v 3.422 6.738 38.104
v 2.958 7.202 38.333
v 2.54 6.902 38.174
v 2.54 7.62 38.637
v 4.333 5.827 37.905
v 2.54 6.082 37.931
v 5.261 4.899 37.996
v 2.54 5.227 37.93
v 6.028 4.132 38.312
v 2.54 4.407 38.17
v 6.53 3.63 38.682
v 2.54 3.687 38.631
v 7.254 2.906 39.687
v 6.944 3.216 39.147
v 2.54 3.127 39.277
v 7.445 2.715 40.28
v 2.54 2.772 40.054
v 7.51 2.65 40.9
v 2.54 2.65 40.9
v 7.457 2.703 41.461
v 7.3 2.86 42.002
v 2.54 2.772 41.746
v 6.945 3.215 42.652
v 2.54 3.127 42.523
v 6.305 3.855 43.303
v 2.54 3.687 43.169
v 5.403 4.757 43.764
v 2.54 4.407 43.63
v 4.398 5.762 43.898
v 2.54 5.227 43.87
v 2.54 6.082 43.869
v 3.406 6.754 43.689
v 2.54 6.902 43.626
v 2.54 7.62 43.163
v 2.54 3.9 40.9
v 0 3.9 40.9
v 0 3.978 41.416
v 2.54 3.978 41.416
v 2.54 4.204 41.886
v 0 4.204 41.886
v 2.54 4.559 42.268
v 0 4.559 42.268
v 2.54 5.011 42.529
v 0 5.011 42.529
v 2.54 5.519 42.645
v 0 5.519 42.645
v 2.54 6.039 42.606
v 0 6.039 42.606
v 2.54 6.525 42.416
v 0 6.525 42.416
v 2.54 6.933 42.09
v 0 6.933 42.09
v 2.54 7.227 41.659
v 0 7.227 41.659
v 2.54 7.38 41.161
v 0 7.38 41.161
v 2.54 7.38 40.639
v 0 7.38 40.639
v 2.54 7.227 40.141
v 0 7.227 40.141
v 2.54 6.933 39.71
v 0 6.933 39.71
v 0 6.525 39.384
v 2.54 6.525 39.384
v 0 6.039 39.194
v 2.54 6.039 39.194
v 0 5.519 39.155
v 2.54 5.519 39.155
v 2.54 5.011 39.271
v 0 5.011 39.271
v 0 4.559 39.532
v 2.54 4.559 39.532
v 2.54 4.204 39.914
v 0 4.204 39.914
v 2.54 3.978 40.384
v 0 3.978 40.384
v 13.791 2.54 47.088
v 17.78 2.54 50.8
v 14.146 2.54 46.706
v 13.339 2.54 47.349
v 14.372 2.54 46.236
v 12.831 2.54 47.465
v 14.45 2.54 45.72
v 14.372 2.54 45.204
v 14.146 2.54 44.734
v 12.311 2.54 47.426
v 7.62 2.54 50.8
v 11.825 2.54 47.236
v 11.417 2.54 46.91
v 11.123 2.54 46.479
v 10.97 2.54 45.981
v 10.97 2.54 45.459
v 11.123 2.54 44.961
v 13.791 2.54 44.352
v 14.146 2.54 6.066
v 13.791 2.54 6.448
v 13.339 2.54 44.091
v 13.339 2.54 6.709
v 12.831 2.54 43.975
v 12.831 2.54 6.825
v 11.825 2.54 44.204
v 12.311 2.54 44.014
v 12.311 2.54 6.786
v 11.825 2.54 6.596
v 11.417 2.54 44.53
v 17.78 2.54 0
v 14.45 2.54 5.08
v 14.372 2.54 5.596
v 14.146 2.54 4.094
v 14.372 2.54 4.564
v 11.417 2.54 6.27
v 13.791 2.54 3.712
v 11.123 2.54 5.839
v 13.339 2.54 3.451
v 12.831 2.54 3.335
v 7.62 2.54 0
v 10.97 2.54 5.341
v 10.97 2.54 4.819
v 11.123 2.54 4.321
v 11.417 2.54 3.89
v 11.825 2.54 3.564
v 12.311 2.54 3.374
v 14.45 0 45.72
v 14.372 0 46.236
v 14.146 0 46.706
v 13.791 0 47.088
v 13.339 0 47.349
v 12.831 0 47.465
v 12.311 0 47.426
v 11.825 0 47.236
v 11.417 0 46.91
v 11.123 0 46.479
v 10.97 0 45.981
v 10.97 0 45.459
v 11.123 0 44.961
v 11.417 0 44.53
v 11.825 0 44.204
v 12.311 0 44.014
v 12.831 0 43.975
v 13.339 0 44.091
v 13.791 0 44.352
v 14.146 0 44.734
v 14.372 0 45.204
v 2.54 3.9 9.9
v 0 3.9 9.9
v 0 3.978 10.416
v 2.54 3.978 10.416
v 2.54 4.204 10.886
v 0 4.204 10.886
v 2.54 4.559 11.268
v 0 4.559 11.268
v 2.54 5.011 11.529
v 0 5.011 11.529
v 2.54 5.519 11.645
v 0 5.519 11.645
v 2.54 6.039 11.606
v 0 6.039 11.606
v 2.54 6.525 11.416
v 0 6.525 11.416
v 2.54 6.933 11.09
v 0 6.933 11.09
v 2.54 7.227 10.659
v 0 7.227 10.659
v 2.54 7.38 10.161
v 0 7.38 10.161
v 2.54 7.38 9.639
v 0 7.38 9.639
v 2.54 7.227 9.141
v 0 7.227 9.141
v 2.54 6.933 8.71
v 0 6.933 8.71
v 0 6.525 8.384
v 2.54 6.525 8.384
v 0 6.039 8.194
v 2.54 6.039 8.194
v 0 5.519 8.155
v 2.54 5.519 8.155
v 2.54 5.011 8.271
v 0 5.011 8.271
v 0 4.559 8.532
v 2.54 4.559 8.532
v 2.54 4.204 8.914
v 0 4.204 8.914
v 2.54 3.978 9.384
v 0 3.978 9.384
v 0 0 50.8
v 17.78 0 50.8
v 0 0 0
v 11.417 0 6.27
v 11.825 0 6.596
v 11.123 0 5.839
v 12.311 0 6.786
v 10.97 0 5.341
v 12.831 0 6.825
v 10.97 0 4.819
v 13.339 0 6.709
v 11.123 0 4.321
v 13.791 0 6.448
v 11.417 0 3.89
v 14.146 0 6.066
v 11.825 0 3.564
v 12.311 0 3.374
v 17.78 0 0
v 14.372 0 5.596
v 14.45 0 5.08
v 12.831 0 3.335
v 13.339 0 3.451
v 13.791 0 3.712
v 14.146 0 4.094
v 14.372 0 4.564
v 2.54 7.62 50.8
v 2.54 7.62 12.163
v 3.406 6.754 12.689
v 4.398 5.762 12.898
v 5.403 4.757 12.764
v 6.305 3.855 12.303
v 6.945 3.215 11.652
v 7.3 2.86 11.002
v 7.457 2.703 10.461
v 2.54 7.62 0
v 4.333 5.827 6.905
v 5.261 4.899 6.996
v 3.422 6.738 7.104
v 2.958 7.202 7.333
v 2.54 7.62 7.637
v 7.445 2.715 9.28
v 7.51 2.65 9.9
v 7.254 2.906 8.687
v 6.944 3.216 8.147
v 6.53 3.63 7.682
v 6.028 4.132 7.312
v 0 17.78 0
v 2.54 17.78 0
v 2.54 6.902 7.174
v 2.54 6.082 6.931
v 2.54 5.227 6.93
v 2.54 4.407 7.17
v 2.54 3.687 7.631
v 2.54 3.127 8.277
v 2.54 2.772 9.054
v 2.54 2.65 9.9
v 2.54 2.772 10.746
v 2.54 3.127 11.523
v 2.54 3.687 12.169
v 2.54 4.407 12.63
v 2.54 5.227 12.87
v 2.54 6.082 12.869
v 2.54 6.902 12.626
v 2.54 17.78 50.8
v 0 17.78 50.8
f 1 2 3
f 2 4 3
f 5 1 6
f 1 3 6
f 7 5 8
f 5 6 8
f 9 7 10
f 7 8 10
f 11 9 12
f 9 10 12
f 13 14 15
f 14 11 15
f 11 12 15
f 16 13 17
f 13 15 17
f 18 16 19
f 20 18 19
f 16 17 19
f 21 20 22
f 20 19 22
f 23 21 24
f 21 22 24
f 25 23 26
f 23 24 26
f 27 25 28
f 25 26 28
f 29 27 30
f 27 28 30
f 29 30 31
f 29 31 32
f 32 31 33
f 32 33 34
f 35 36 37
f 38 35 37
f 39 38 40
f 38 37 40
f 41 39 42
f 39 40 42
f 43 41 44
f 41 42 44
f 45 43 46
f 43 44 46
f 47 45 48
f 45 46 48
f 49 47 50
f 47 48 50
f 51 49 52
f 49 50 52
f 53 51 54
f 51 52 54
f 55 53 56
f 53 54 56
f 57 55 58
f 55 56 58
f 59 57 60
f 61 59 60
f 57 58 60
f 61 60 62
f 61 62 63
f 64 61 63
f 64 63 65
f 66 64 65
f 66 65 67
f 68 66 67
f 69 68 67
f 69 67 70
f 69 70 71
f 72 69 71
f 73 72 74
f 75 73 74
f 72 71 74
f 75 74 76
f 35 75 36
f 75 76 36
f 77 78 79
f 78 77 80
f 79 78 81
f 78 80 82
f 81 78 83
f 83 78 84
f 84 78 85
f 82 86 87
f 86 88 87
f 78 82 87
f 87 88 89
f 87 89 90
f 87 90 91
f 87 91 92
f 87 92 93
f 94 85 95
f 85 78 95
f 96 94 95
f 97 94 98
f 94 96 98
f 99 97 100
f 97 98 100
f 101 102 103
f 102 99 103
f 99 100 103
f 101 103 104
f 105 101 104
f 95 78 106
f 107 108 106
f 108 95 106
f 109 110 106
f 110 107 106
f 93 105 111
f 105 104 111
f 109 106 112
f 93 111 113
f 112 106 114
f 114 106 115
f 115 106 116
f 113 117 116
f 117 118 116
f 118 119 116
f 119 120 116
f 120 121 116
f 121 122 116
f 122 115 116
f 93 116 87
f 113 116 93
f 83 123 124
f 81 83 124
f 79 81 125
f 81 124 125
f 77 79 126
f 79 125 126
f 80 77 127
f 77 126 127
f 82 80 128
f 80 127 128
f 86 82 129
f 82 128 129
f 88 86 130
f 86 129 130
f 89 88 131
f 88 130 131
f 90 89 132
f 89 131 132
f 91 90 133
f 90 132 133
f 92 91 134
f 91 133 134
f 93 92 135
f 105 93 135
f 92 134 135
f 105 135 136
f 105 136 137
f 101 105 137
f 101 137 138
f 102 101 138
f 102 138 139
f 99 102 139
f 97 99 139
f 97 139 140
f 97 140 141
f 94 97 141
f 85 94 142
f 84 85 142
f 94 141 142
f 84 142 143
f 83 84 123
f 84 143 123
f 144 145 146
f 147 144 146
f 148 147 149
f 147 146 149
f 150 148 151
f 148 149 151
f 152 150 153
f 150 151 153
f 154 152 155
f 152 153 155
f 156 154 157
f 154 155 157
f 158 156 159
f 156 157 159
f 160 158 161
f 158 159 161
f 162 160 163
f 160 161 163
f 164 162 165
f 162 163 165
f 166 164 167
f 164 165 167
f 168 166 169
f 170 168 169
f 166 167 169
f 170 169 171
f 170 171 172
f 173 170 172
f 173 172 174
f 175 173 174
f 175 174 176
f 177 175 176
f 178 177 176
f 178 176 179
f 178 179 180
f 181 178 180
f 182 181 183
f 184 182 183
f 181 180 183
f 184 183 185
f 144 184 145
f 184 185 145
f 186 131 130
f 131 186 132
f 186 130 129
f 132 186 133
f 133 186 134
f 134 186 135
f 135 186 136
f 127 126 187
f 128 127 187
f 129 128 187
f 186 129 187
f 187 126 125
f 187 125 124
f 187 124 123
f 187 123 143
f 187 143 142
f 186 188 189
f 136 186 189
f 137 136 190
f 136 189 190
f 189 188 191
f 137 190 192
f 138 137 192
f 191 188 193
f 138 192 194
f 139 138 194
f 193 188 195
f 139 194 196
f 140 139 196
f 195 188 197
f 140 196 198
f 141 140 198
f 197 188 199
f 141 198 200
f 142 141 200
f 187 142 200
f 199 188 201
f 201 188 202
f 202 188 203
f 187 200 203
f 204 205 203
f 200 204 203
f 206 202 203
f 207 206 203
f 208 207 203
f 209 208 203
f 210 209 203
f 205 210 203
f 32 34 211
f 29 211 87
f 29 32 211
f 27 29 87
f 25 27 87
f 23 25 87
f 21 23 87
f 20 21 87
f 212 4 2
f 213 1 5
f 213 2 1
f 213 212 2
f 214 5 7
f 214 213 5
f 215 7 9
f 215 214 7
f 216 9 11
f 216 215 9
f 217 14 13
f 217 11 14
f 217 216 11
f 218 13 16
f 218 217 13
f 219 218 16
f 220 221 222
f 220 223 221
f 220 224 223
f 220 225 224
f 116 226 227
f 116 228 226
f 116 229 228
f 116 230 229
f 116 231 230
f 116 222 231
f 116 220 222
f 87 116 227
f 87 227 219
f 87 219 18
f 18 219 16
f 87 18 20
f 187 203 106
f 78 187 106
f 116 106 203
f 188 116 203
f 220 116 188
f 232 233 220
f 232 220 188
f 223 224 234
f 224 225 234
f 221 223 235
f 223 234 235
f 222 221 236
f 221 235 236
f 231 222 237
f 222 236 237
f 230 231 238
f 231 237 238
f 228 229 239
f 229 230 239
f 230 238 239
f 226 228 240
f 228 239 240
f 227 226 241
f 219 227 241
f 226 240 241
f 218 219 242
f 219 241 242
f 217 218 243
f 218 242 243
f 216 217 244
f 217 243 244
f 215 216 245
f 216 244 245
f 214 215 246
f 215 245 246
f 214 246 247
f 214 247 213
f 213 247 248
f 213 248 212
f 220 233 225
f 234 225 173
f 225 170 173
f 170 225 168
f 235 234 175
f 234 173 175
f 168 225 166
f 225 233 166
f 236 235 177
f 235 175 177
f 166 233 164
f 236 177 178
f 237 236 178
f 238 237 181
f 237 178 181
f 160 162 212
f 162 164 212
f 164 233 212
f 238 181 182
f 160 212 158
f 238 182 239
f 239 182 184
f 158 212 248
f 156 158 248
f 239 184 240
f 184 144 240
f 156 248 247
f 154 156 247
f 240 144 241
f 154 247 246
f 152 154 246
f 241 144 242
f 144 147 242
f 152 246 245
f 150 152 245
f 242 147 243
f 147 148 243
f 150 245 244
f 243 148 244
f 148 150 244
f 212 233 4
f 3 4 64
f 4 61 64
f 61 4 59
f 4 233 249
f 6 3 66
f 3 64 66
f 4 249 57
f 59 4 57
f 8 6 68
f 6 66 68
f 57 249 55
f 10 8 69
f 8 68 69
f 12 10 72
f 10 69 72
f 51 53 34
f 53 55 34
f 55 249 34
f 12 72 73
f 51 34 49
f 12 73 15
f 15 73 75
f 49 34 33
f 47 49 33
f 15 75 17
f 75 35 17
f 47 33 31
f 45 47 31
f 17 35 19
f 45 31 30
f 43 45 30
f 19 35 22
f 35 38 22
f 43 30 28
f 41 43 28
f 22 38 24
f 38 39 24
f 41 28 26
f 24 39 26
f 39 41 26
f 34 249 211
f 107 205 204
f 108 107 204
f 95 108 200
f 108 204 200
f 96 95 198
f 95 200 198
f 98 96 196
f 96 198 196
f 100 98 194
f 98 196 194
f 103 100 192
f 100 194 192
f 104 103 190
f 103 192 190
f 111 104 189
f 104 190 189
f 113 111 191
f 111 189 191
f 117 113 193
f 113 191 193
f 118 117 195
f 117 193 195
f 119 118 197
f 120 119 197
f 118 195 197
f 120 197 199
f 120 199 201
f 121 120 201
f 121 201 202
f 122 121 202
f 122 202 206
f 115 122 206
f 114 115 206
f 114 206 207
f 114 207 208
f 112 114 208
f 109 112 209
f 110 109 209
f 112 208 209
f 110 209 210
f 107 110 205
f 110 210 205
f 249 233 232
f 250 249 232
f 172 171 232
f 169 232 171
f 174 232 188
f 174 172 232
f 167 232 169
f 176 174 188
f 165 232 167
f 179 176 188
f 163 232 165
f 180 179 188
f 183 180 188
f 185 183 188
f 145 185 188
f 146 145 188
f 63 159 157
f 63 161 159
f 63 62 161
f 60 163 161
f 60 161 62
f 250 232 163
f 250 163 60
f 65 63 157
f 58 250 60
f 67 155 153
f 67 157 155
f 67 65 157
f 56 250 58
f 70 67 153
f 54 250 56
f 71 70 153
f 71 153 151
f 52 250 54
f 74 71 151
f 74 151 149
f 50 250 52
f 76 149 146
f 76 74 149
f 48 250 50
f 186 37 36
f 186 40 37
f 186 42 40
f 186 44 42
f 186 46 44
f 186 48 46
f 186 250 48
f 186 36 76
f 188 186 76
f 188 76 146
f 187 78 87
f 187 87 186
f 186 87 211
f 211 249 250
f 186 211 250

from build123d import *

# Parameters (mm, degrees)
F1_DEPTH    = 50.8
F2_R        = 1.75
F3_DEPTH    = 25.4
F5_T4_DEPTH = 50.8
F5_S5_R     = 1.75
F5_T6_DEPTH = 27
F5_S7_R     = 1.75
F5_T8_DEPTH = 27
F2_R_2      = 3
F6_DEPTH    = 7.511
F7_DEPTH    = 2.54
F4_R        = 1.75
F8_DEPTH    = 2.54


# Not quite as in the source:
# - a fillet or chamfer that OpenCascade refuses, or shapes differently, is made with other operations: its cross-section is extruded or revolved along the edge and cut away or added


with BuildPart() as f1:
    # F0 (on Top) → F1 (new body)
    with BuildSketch(Plane.XY):
        Polygon((0, 17.78), (0, 0), (17.78, 0), (17.78, 2.54), (2.54, 2.54), (2.54, 17.78), align=None)
    extrude(amount=F1_DEPTH)

    # F2 (on face) → F3 (cut)
    with BuildSketch(Plane(origin=(0, 0, 0), x_dir=(0, -1, 0), z_dir=(-1, 0, 0))):
        with Locations((-5.65, 9.9)):
            Circle(F2_R)
        with Locations((-5.65, 40.9)):
            Circle(F2_R)
    extrude(amount=-F3_DEPTH, mode=Mode.SUBTRACT)

    # F5: chamfer of 5.08 on 1 edges, made by hand


with BuildPart() as f5_tool2:
    # F5_s3 → F5_t4 (new body)
    with BuildSketch(Plane.XY):
        Polygon((2.54, 7.62), (7.62, 2.54), (2.54, 2.54), align=None)
    extrude(amount=F5_T4_DEPTH)

    # F5_s5 → F5_t6 (cut, symmetric)
    with BuildSketch(Plane.YZ.offset(5.1)):
        with Locations((5.65, 40.9)):
            Circle(F5_S5_R)
    extrude(amount=F5_T6_DEPTH, both=True, mode=Mode.SUBTRACT)

    # F5_s7 → F5_t8 (cut, symmetric)
    with BuildSketch(Plane.YZ.offset(5.1)):
        with Locations((5.65, 9.9)):
            Circle(F5_S7_R)
    extrude(amount=F5_T8_DEPTH, both=True, mode=Mode.SUBTRACT)


with BuildPart() as f1_1:
    add(f1.part)

    # F5_t1: union F5_tool2
    add(f5_tool2.part)

    # F2 (on face) → F6 (cut, through all)
    with BuildSketch(Plane(origin=(0, 0, 0), x_dir=(0, -1, 0), z_dir=(-1, 0, 0))):
        with Locations((-5.65, 40.9)):
            Circle(F2_R_2)
        with Locations((-5.65, 40.9)):
            Circle(F2_R, mode=Mode.SUBTRACT)
        with Locations((-5.65, 9.9)):
            Circle(F2_R_2)
        with Locations((-5.65, 9.9)):
            Circle(F2_R, mode=Mode.SUBTRACT)
    extrude(amount=-F6_DEPTH, mode=Mode.SUBTRACT)

    # F2 (on face) → F7 (join)
    with BuildSketch(Plane(origin=(0, 0, 0), x_dir=(0, -1, 0), z_dir=(-1, 0, 0))):
        with Locations((-5.65, 40.9)):
            Circle(F2_R_2)
        with Locations((-5.65, 40.9)):
            Circle(F2_R, mode=Mode.SUBTRACT)
        with Locations((-5.65, 9.9)):
            Circle(F2_R_2)
        with Locations((-5.65, 9.9)):
            Circle(F2_R, mode=Mode.SUBTRACT)
    extrude(amount=-F7_DEPTH)

    # F4 (on face) → F8 (cut, through all)
    with BuildSketch(Plane.XZ):
        with Locations((12.7, 45.72)):
            Circle(F4_R)
        with Locations((12.7, 5.08)):
            Circle(F4_R)
    extrude(amount=-F8_DEPTH, mode=Mode.SUBTRACT)


solid = f1_1.part
